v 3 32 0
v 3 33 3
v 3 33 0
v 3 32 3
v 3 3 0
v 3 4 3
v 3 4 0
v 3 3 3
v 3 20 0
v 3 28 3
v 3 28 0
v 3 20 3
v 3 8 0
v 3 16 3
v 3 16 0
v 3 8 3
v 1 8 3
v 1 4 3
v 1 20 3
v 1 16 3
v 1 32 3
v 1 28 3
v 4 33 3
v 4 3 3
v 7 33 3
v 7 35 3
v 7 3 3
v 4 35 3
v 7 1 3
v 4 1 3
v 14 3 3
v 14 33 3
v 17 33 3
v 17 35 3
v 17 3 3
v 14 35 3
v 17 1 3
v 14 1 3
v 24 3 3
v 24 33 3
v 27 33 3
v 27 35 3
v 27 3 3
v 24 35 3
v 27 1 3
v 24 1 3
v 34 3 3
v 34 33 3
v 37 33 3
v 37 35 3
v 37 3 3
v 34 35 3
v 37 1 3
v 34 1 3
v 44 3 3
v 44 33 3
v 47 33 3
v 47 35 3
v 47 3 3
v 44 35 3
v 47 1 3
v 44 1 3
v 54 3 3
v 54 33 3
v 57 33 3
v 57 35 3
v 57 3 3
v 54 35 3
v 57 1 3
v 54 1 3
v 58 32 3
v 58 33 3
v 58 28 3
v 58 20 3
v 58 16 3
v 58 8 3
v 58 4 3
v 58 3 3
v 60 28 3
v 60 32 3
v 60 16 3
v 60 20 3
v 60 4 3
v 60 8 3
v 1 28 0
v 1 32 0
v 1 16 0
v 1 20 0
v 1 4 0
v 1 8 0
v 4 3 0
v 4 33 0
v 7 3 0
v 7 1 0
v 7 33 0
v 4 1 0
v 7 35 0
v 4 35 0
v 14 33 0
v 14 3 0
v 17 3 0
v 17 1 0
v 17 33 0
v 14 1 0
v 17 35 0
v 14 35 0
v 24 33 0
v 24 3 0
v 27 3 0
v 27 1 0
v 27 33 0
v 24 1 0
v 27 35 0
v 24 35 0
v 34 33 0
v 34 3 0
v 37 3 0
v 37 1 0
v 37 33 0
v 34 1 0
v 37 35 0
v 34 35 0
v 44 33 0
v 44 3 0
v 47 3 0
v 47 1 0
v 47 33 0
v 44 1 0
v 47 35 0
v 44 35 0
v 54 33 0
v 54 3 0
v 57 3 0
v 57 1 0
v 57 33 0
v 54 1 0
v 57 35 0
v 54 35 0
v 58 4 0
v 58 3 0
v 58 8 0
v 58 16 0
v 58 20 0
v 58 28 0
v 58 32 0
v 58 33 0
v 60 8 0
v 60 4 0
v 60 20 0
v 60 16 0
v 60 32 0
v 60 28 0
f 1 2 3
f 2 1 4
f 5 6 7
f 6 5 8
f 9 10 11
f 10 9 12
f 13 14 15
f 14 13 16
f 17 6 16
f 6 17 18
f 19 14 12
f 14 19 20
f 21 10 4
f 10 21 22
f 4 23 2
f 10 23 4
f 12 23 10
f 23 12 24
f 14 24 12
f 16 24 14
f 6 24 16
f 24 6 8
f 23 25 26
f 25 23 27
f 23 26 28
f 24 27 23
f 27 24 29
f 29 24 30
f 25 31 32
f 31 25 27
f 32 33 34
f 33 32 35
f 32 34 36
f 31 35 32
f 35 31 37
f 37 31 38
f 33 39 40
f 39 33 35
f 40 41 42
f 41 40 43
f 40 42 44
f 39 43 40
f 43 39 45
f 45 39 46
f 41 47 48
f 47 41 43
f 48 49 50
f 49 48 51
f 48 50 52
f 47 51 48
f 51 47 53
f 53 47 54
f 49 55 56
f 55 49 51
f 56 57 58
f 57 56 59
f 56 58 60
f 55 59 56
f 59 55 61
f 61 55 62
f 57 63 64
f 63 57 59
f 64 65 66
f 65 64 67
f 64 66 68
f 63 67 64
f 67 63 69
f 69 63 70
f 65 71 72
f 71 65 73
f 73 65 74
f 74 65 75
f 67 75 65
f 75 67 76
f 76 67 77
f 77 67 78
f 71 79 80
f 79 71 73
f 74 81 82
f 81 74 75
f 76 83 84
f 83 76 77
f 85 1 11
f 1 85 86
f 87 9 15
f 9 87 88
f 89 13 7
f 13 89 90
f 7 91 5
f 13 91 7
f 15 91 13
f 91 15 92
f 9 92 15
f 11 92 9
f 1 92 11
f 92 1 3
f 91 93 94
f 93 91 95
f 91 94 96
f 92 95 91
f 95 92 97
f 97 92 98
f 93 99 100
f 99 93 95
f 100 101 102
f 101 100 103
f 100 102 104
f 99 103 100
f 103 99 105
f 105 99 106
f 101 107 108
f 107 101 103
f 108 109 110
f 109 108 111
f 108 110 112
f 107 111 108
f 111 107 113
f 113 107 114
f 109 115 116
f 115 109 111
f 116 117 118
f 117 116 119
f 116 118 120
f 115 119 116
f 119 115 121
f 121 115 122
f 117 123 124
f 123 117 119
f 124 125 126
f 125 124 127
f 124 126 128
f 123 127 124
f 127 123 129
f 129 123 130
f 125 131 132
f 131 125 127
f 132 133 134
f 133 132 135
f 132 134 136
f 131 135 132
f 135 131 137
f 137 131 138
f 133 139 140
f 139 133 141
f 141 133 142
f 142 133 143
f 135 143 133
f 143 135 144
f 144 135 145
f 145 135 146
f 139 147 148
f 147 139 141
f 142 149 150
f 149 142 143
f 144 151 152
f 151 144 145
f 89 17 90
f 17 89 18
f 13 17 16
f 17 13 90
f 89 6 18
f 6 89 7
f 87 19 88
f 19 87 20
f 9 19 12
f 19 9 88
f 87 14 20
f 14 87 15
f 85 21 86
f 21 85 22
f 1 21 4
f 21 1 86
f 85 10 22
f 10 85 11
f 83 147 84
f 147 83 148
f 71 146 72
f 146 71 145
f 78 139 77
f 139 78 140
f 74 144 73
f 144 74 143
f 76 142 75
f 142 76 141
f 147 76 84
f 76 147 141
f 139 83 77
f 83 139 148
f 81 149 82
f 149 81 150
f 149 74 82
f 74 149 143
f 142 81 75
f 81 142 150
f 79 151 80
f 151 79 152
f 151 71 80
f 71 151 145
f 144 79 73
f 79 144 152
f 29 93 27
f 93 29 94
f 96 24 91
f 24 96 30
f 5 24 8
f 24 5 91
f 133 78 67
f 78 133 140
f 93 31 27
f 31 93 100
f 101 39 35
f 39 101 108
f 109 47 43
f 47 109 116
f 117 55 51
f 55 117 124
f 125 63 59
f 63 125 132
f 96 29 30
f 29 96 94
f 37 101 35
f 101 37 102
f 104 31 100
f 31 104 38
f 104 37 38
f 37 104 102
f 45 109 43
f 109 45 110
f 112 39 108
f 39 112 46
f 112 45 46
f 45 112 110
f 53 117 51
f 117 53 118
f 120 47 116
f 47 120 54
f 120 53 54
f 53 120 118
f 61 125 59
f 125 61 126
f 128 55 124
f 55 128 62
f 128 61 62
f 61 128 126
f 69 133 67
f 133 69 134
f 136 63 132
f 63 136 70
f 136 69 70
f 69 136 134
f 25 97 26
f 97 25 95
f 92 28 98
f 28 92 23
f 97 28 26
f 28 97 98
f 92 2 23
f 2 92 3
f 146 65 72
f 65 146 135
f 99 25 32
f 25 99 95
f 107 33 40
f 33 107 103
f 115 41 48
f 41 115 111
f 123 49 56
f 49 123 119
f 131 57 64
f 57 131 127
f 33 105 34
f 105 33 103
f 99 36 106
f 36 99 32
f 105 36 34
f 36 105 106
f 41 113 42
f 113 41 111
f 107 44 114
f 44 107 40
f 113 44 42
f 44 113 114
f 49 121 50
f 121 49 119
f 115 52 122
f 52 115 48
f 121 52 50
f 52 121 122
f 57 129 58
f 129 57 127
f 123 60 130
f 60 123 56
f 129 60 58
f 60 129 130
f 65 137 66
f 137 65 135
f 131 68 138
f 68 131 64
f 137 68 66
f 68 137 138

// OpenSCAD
length = 61;
breadth = 36;
lct = 3; //laser cut sheet thickness (change the length and breadth accordingly)
flag = 0; // change flag for alternate position of teeth
tol = 1; //tolerance
union(){
        translate([lct,lct,0])cube([length-(2*lct),breadth-(2*lct),lct]);  //center cuboid

        for(y=[lct+tol:12:breadth])translate([tol,y,0])cube([lct-tol,6-2*tol,lct]);  //left
        for(y=[lct+tol:12:breadth])translate([length-lct,y,0])cube([lct-tol,6-2*tol,lct]);  //right
            
        if(flag == 0){
            for(x=[lct+tol:10:length])translate([x,tol,0])cube([5-2*tol,lct-tol,lct]);  //bottom
            for(x=[lct+tol:10:length])translate([x,breadth-lct,0])cube([5-tol*2,lct-tol,lct]);  //top 
        }
        if(flag == 1){
            for(x=[lct+5+tol:10:length-lct-1])translate([x,tol,0])cube([5-2*tol,lct-tol,lct]);
            for(x=[lct+5+tol:10:length-lct-1])translate([x,breadth-lct,0])cube([5-2*tol,lct-tol,lct]);
        }
        }
